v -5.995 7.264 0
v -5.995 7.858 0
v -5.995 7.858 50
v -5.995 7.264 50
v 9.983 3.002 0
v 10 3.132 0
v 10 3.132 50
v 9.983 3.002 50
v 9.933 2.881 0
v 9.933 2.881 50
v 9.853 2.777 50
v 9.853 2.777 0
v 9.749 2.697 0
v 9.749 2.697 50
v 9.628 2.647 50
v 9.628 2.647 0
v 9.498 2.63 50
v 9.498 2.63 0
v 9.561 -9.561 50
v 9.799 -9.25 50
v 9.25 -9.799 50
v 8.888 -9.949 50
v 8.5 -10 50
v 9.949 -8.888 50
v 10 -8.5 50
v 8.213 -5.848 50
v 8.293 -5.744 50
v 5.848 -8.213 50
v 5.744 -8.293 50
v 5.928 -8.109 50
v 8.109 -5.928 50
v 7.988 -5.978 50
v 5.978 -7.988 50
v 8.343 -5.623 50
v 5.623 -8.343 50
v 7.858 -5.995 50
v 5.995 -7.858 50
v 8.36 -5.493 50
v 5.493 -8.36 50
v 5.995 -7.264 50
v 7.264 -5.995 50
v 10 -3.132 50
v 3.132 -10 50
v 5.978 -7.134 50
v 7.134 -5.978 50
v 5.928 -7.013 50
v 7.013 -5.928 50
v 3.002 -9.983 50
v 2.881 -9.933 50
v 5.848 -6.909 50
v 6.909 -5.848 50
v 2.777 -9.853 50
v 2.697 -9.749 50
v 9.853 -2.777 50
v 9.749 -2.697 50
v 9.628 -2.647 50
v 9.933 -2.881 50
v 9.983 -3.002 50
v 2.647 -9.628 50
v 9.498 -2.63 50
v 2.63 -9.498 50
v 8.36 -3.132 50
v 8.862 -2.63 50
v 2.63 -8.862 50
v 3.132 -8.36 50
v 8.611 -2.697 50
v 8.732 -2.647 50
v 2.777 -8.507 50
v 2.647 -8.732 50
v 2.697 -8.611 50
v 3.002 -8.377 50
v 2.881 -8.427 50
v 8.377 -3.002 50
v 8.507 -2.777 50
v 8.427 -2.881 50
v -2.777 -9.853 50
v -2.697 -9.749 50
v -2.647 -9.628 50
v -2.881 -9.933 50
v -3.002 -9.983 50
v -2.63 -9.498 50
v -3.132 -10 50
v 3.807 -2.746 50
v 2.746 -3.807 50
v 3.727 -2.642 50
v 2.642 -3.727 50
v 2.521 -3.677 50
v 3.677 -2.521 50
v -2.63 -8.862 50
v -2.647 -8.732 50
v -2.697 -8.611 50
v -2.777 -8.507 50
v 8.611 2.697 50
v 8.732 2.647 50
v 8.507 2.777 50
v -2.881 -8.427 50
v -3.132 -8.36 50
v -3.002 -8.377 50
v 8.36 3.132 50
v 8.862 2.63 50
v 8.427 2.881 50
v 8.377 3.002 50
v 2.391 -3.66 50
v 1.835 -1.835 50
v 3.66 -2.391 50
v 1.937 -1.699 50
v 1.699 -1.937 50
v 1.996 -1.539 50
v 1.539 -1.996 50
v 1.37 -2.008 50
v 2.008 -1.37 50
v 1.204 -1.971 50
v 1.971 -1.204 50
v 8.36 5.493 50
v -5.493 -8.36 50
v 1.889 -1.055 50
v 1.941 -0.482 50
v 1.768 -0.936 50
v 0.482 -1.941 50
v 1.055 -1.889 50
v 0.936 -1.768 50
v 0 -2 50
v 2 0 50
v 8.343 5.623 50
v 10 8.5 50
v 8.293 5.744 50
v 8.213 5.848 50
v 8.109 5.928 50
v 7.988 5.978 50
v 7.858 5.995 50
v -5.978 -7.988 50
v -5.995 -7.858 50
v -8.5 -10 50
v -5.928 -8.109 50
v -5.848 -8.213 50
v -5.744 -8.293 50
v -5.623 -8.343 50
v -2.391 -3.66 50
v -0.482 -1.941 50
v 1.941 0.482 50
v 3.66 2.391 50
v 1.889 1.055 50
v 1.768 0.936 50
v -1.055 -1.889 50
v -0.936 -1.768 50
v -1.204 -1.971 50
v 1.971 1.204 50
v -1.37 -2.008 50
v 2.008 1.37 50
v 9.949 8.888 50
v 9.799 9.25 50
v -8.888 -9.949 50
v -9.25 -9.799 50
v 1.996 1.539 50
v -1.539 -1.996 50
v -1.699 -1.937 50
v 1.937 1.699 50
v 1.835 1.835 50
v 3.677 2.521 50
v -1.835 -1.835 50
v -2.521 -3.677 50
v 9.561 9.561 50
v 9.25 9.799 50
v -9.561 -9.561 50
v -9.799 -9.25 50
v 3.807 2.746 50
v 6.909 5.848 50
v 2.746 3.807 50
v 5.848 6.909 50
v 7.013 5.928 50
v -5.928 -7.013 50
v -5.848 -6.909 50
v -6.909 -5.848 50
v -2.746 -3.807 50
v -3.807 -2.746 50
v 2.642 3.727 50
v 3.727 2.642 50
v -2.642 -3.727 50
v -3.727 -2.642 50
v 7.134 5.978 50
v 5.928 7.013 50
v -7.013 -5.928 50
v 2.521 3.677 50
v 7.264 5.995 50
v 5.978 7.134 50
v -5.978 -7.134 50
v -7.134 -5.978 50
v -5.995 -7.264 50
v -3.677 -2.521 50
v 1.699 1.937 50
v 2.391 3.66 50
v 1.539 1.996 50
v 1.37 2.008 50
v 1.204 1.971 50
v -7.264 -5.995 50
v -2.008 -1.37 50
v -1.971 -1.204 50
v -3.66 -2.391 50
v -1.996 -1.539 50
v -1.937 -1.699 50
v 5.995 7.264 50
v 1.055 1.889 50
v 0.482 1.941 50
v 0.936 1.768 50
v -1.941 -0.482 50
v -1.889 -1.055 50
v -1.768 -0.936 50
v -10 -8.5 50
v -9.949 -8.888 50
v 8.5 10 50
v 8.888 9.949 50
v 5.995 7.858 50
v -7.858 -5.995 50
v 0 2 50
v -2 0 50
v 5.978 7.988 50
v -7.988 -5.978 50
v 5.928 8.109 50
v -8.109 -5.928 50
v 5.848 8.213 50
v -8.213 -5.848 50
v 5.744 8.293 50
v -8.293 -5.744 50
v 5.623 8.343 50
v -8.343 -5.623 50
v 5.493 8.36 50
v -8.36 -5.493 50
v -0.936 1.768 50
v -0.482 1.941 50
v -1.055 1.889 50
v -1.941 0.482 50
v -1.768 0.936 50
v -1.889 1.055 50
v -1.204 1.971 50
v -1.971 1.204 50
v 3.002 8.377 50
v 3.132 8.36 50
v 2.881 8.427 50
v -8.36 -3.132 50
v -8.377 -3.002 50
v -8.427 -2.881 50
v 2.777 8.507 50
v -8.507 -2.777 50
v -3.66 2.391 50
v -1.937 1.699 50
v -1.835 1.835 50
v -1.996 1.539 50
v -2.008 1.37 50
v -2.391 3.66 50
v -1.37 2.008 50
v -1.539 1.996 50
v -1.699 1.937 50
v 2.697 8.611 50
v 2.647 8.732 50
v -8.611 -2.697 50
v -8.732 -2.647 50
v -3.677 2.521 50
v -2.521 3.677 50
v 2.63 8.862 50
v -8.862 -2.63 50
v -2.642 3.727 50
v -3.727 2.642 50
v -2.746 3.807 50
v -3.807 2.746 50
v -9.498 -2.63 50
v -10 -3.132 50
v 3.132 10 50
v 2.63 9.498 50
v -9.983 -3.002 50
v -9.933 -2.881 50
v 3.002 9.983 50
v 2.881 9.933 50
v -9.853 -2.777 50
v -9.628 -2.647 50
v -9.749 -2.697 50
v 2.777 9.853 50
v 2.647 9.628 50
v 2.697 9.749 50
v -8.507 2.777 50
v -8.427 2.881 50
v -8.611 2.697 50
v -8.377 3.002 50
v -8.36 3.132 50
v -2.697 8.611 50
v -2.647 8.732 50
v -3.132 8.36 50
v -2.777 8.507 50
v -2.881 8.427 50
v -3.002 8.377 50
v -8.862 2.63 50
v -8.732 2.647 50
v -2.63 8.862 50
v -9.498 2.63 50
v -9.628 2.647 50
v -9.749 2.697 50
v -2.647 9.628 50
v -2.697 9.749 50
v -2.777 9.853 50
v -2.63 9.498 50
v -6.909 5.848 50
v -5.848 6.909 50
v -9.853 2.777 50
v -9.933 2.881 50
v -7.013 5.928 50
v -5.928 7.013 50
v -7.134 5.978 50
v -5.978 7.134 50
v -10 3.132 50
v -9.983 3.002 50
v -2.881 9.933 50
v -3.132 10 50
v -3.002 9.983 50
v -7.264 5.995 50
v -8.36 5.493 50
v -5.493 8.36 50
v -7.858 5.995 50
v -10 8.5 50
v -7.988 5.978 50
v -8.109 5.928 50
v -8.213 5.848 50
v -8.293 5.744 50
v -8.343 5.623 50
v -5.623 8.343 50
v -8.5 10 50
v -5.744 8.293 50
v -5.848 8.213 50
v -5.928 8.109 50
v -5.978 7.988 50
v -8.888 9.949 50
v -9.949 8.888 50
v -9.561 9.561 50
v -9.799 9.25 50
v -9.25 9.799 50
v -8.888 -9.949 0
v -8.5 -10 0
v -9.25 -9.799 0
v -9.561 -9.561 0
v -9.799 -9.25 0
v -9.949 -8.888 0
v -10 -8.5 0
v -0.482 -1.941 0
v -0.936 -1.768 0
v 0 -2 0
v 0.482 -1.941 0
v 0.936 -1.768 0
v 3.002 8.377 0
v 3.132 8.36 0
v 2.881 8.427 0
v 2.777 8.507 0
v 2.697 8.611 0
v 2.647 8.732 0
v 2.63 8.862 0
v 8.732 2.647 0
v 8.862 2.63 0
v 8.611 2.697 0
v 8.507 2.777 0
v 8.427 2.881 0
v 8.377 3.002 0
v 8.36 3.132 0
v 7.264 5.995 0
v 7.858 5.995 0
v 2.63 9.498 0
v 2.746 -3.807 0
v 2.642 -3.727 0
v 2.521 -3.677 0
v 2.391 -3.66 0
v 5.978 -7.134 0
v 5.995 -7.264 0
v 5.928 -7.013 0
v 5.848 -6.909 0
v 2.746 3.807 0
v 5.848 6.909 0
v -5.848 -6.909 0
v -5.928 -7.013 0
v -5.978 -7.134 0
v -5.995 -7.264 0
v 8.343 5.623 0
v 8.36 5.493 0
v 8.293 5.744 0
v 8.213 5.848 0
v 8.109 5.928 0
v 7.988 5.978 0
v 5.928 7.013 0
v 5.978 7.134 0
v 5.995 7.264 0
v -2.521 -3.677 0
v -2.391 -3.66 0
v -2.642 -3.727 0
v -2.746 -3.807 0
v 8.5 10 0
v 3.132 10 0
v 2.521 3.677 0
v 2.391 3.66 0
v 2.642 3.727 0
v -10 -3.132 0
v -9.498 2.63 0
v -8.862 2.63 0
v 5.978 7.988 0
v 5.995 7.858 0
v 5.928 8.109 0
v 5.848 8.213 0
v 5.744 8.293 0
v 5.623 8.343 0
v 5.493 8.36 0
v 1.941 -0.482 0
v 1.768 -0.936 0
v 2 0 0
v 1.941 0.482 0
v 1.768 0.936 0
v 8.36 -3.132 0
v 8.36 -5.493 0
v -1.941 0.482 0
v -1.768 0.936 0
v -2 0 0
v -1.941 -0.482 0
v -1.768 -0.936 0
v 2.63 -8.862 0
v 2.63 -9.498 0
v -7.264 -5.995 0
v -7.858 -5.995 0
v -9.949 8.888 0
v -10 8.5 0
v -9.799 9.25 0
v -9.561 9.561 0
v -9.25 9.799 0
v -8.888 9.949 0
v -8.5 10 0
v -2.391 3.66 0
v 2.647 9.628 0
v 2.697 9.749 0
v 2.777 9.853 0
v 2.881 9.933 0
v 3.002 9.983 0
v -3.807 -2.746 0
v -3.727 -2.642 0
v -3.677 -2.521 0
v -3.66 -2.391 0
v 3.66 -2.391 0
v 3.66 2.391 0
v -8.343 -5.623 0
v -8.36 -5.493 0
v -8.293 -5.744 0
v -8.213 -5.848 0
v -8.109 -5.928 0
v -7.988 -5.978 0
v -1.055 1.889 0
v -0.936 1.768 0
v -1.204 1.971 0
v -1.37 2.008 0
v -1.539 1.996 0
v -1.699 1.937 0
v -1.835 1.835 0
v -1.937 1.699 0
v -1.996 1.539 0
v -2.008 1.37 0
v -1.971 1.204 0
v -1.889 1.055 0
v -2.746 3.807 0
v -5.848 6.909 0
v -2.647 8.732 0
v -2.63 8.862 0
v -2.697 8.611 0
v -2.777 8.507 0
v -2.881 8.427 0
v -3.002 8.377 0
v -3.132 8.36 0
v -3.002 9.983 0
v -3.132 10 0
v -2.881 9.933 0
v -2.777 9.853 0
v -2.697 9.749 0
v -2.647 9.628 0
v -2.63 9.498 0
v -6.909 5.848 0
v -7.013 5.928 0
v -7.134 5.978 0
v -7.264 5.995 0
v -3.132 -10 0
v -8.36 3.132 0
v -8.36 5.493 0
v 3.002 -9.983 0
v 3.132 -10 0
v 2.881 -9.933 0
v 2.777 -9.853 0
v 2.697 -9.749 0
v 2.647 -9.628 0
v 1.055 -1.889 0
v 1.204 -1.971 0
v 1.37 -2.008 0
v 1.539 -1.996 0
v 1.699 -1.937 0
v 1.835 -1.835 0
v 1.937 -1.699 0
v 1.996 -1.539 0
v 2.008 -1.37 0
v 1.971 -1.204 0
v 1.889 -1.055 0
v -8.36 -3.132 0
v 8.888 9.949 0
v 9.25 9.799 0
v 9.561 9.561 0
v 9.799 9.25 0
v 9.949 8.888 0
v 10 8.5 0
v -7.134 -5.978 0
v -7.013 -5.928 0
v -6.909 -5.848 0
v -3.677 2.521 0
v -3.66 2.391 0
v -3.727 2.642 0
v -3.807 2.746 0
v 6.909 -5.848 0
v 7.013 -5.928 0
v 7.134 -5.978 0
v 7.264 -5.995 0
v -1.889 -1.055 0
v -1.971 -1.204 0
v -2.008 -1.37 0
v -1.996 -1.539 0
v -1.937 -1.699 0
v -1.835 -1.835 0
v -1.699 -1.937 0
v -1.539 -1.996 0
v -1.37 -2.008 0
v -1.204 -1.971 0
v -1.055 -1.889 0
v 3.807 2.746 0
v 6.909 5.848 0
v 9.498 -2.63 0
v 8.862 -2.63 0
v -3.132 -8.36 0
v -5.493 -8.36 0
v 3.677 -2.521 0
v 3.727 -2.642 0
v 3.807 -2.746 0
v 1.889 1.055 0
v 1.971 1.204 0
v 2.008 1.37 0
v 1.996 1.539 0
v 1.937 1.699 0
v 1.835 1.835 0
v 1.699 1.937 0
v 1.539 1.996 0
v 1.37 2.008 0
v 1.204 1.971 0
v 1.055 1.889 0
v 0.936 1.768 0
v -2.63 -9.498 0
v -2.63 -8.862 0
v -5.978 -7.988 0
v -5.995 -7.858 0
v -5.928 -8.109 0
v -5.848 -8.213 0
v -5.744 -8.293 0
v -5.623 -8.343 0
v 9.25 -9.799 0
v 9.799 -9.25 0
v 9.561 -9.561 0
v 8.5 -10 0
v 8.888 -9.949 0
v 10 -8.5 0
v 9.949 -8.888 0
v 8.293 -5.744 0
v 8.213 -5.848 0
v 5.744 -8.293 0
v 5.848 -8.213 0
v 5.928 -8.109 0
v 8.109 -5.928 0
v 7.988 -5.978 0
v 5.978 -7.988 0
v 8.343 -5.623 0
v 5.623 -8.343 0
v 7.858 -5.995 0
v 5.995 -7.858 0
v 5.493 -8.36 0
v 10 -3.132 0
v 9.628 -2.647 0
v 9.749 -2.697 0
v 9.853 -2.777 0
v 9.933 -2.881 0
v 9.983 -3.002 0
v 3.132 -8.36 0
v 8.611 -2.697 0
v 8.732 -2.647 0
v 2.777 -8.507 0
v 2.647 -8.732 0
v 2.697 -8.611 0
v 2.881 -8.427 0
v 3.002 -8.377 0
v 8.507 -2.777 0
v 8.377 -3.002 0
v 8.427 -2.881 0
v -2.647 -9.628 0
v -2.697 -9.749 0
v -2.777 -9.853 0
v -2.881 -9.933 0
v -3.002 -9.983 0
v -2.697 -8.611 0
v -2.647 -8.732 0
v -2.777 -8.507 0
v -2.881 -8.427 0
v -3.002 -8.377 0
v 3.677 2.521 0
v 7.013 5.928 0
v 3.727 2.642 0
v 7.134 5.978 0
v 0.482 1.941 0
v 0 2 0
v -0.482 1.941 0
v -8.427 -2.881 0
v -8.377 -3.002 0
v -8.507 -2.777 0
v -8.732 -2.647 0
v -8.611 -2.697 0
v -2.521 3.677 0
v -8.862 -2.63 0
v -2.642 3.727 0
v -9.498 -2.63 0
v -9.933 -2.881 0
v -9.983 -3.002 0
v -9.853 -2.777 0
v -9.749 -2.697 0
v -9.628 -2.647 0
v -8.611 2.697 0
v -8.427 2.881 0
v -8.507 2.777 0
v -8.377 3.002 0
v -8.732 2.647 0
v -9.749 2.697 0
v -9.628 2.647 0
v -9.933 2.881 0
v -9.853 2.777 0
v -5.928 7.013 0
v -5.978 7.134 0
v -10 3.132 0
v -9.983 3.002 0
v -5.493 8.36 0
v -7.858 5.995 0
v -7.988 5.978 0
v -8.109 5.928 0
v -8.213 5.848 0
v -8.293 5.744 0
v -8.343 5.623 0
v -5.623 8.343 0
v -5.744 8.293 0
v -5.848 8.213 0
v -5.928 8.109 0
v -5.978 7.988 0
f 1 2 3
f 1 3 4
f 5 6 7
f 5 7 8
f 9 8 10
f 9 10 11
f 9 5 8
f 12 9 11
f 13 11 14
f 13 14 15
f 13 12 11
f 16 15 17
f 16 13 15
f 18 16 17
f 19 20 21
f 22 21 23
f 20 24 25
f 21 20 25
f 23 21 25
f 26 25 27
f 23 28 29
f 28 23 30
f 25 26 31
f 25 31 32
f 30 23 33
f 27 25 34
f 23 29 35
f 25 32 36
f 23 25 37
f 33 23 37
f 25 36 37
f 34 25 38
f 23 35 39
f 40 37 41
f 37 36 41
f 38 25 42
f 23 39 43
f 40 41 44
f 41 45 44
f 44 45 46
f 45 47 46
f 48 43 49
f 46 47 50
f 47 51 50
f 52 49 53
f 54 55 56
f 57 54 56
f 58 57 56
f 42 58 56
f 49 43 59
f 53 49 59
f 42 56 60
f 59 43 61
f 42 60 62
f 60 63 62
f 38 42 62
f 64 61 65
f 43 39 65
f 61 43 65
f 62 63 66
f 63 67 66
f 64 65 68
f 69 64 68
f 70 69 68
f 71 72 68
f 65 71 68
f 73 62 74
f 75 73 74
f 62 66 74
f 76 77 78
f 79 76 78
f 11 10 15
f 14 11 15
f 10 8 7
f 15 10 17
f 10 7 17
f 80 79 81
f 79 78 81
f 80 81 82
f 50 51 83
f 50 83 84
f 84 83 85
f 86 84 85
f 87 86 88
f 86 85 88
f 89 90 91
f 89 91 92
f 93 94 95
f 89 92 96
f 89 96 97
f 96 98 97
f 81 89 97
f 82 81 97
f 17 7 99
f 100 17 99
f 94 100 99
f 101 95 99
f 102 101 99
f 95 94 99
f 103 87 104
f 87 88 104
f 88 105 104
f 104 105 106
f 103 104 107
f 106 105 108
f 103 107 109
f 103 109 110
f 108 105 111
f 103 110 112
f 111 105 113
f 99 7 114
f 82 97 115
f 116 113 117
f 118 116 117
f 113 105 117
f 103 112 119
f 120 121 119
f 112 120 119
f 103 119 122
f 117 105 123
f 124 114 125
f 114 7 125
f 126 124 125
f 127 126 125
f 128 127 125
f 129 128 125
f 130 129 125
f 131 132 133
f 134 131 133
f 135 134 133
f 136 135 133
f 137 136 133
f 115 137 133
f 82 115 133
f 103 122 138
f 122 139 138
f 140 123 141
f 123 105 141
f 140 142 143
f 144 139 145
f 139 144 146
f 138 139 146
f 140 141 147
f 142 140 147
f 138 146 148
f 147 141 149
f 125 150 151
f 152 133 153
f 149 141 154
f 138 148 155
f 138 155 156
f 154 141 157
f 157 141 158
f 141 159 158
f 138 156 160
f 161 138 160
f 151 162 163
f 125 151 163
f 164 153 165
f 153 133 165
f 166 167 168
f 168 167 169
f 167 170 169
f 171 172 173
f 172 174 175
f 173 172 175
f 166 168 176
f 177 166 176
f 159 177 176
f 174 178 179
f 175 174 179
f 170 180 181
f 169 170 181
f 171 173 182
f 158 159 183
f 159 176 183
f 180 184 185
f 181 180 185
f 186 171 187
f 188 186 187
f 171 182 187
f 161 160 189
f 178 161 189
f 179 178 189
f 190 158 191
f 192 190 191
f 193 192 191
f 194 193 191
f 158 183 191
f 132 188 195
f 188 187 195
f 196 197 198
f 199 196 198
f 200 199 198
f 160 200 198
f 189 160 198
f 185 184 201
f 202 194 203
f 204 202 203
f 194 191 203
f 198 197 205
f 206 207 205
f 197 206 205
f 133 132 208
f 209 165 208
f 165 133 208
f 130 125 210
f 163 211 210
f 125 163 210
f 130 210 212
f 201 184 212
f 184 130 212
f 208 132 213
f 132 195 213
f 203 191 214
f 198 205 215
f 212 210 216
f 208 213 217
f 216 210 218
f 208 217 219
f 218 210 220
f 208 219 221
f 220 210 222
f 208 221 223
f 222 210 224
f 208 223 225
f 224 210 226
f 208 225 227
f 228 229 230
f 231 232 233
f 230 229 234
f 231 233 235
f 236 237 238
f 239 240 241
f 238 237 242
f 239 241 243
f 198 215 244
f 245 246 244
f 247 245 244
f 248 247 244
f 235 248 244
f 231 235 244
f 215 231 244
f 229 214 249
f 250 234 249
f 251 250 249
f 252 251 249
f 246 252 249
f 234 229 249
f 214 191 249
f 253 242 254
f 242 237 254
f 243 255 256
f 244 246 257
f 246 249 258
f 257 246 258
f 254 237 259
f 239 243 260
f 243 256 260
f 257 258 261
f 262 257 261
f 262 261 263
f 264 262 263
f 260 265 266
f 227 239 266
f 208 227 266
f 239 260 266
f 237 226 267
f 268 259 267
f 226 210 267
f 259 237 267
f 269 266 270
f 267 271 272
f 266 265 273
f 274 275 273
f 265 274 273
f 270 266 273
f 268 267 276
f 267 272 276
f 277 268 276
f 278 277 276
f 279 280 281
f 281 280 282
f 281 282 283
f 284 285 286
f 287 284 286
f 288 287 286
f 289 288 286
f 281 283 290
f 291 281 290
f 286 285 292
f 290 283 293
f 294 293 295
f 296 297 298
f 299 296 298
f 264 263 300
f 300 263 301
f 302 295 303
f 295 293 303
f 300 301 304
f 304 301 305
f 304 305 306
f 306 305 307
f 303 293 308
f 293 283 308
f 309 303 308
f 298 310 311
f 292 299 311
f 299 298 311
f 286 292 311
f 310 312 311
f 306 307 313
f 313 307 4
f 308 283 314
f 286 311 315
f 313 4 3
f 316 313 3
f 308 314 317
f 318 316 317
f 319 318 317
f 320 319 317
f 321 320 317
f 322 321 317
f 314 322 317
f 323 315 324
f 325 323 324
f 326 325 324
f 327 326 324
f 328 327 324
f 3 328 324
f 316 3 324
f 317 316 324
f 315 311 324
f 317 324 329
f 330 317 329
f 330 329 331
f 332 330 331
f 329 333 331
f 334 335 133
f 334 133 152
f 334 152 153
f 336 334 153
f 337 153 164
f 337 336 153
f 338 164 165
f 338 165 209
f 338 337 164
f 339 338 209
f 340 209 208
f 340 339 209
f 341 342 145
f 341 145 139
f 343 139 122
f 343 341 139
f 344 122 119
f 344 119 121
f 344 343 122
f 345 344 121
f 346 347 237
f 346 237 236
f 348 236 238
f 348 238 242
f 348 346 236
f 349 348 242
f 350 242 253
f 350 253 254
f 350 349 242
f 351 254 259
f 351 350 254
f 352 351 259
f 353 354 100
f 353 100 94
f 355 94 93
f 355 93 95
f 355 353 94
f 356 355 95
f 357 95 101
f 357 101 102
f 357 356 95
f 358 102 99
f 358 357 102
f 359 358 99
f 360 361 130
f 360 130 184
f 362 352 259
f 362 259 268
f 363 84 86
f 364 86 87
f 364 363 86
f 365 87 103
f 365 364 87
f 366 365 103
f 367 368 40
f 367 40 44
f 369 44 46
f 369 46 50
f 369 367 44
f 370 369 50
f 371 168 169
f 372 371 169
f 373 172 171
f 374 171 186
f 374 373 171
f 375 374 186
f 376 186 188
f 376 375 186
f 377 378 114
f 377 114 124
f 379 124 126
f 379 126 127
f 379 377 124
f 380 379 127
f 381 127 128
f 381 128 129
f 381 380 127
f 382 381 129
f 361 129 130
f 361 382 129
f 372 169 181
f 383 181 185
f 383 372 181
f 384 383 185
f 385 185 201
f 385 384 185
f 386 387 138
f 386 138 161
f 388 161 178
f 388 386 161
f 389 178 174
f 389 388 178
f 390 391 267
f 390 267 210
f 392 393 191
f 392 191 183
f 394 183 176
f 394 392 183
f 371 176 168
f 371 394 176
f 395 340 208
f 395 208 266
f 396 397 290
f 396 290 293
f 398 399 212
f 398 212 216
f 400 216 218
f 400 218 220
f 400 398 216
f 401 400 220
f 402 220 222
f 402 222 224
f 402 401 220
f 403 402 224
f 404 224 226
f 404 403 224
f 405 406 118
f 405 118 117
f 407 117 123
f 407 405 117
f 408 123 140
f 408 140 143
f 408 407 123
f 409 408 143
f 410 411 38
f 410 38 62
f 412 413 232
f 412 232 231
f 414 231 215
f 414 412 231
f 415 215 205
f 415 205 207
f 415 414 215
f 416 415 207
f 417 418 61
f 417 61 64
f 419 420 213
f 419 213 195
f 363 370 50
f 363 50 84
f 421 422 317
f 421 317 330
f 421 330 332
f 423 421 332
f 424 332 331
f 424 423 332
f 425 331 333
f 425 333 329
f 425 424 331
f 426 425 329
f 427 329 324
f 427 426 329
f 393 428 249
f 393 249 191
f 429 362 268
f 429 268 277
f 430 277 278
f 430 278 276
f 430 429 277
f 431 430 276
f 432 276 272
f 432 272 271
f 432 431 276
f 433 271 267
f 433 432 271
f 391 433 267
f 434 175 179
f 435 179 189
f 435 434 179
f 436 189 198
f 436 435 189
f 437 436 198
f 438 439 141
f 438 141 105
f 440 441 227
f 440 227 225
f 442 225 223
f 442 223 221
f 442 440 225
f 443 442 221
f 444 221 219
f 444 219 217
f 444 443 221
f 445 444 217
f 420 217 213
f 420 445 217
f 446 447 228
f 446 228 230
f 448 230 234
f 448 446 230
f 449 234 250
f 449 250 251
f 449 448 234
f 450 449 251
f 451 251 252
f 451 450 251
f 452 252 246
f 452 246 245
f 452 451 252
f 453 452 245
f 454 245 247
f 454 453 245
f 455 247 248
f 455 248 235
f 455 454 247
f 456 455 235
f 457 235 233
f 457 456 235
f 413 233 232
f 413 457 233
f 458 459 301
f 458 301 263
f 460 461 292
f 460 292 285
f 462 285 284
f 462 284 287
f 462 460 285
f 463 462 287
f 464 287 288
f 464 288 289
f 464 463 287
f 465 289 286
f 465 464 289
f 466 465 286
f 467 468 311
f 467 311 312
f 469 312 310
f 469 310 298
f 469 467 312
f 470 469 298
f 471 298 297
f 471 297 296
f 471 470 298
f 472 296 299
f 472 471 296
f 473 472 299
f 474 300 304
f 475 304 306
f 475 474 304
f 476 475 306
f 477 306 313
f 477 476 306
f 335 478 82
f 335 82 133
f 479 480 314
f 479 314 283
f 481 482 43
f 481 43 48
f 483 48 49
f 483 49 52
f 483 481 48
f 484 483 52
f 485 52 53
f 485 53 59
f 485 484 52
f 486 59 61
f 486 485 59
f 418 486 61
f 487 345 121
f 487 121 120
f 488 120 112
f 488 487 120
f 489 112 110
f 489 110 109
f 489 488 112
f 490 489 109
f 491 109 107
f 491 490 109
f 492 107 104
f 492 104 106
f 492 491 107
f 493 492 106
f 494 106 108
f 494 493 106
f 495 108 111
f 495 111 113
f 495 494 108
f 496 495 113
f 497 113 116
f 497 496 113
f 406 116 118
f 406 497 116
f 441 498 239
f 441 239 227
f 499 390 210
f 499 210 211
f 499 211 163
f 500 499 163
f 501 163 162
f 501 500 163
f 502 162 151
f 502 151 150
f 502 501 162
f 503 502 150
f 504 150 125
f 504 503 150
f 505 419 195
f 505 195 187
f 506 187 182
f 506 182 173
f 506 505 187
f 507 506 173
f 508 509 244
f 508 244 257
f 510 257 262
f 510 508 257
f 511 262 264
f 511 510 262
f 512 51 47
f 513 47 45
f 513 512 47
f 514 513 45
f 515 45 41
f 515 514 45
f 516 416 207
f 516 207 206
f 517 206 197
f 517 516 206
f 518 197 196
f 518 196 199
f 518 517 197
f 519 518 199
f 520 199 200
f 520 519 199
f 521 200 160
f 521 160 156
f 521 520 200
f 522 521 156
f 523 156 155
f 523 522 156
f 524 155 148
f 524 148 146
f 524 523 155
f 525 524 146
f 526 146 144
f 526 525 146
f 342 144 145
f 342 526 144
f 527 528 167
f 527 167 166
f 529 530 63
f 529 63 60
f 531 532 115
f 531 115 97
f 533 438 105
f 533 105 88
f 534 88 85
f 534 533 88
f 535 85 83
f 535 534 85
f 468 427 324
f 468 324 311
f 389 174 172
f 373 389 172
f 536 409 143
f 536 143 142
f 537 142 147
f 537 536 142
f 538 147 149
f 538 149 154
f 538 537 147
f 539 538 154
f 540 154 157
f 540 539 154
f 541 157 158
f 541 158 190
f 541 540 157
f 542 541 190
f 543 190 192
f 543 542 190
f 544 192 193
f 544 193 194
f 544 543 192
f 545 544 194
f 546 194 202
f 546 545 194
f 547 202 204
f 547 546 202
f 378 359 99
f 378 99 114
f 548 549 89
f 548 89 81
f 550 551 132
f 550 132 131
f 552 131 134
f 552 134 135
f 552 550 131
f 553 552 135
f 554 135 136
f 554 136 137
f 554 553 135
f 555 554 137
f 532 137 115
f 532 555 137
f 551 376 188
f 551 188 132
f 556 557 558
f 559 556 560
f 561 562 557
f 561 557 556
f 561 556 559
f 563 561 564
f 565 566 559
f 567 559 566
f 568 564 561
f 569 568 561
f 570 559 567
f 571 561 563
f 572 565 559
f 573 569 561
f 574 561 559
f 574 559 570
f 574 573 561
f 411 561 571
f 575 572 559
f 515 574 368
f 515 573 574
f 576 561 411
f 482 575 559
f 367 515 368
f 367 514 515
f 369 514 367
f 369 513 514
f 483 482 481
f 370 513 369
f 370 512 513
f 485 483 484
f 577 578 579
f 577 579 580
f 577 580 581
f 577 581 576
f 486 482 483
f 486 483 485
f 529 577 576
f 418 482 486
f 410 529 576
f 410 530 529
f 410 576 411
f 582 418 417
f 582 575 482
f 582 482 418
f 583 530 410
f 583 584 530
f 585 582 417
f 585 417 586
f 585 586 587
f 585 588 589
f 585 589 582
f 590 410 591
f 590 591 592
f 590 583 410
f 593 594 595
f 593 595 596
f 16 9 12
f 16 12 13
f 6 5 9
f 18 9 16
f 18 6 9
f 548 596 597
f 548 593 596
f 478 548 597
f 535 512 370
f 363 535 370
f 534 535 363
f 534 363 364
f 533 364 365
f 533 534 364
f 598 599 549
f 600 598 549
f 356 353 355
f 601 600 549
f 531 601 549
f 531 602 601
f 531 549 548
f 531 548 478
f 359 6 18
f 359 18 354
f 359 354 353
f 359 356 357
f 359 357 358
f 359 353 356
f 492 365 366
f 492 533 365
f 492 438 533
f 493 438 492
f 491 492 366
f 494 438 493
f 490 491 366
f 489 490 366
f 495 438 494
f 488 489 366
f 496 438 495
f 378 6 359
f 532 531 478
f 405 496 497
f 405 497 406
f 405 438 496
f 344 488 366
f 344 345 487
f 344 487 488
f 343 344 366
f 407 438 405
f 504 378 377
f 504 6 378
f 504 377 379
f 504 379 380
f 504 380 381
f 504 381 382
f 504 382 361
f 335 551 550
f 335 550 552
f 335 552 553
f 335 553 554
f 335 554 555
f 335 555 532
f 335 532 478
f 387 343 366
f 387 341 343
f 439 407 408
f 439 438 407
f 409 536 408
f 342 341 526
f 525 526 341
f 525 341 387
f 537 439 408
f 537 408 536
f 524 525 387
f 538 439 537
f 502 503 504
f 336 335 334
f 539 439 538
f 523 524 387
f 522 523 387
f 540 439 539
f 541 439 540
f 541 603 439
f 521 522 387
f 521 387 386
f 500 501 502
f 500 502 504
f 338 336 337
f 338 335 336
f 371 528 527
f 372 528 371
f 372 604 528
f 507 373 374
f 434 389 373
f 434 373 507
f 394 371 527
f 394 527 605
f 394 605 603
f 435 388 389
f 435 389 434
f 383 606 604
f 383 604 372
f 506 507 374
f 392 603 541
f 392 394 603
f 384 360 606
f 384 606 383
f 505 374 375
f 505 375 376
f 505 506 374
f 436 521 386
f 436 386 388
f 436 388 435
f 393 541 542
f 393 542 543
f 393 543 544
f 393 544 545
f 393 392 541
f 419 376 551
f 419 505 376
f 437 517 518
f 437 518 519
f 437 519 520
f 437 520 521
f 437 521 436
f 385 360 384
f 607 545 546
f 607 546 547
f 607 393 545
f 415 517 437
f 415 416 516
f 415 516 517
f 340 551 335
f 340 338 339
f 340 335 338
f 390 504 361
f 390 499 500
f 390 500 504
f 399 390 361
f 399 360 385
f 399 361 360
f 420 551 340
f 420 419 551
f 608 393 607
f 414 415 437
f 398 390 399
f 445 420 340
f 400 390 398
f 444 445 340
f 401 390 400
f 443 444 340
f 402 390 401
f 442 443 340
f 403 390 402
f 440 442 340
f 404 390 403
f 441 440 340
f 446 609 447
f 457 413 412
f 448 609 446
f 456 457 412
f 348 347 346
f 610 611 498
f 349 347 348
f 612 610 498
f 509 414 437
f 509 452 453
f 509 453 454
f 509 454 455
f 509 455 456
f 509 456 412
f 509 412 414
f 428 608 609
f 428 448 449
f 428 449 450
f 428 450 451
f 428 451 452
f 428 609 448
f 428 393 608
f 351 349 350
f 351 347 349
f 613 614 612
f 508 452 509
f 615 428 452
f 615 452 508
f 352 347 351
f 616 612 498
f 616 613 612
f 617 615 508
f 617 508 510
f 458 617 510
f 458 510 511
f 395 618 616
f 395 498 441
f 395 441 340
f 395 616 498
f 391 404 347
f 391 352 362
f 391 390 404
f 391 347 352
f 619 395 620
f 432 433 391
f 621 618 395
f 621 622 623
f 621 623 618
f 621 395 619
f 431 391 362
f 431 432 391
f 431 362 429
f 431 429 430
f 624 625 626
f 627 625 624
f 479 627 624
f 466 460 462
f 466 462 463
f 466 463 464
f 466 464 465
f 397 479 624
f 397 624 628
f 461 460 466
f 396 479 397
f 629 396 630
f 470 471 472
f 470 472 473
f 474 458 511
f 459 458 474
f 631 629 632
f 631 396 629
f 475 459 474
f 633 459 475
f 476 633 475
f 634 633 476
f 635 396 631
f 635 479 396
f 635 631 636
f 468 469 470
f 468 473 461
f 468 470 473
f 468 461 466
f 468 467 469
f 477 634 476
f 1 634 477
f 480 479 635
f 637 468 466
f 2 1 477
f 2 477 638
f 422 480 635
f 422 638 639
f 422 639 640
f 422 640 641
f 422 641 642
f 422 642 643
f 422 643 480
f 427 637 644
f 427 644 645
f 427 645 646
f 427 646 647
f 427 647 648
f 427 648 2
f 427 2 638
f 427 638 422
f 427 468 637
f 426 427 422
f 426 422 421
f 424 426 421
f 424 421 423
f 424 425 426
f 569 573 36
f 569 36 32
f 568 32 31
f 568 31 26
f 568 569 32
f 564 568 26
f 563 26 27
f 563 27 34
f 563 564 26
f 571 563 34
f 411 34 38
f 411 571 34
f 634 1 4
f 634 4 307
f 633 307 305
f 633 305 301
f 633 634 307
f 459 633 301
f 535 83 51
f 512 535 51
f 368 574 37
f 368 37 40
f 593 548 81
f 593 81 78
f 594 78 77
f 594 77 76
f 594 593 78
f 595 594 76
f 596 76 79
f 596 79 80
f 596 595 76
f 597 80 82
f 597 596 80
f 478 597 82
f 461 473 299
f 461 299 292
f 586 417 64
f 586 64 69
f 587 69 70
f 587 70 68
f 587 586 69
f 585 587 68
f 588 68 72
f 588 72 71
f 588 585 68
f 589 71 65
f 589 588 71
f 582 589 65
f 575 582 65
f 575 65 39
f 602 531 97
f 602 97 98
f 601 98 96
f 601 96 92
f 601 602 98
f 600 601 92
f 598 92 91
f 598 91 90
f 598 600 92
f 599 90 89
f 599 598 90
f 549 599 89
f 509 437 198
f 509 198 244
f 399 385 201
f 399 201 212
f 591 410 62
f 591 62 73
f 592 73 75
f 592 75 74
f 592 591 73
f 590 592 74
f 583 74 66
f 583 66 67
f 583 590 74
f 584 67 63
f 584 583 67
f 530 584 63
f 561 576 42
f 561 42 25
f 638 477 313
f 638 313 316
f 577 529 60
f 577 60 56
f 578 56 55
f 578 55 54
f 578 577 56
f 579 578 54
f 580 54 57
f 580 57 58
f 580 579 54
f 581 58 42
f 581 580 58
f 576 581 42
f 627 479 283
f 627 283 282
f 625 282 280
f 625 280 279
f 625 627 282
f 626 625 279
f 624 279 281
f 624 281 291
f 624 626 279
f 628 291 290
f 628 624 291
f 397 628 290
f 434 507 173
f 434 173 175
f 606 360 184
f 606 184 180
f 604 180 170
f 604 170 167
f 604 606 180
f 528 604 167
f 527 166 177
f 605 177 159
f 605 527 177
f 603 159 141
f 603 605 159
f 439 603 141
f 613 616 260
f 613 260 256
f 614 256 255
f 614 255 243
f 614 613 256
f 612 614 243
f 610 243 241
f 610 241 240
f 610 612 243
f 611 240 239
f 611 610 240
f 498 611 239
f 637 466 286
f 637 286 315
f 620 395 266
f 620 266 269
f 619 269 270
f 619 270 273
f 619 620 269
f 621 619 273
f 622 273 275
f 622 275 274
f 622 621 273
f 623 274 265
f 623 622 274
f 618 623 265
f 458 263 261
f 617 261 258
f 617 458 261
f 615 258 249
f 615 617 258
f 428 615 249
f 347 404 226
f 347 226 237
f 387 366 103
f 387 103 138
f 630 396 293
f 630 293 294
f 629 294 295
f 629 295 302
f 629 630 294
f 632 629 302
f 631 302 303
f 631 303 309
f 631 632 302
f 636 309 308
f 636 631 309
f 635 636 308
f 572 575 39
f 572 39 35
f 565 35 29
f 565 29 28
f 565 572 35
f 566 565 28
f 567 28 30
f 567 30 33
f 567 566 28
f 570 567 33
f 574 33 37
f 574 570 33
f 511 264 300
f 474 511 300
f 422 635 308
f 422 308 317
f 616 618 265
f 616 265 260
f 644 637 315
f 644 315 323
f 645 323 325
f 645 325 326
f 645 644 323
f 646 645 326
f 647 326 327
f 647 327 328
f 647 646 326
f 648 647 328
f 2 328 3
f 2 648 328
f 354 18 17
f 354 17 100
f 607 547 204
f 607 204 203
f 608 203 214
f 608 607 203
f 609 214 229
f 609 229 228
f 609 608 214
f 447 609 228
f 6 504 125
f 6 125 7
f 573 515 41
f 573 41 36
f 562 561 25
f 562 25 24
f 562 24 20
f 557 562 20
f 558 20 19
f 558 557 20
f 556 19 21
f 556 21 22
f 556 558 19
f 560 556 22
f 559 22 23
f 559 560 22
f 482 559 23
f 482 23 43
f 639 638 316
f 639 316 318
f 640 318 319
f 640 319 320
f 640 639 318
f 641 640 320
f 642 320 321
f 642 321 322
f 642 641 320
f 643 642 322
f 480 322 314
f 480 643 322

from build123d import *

# Parameters (mm, degrees)
BOSS_EXTRUDE1_DEPTH = 50


with BuildPart() as part:
    # Sketch1 → Boss-Extrude1 (new body)
    with BuildSketch(Plane.XY):
        with BuildLine():
            Line((-2.746356642, -3.807016814), (-5.847983186, -6.908643358))
            ThreePointArc((-5.847983186, -6.908643358), (-5.956791575, -7.07148662), (-5.995, -7.263573344))
            Line((-5.995, -7.263573344), (-5.995, -7.858053199))
            ThreePointArc((-5.995, -7.858053199), (-5.847983186, -8.212983186), (-5.493053199, -8.36))
            Line((-5.493053199, -8.36), (-3.131946801, -8.36))
            ThreePointArc((-3.131946801, -8.36), (-2.777016814, -8.507016814), (-2.63, -8.861946801))
            Line((-2.63, -8.861946801), (-2.63, -9.498053199))
            ThreePointArc((-2.63, -9.498053199), (-2.777016814, -9.852983186), (-3.131946801, -10))
            Line((-3.131946801, -10), (-8.5, -10))
            ThreePointArc((-8.5, -10), (-9.560660172, -9.560660172), (-10, -8.5))
            Line((-10, -8.5), (-10, -3.131946801))
            ThreePointArc((-10, -3.131946801), (-9.852983186, -2.777016814), (-9.498053199, -2.63))
            Line((-9.498053199, -2.63), (-8.861946801, -2.63))
            ThreePointArc((-8.861946801, -2.63), (-8.507016814, -2.777016814), (-8.36, -3.131946801))
            Line((-8.36, -3.131946801), (-8.36, -5.493053199))
            ThreePointArc((-8.36, -5.493053199), (-8.212983186, -5.847983186), (-7.858053199, -5.995))
            Line((-7.858053199, -5.995), (-7.263573344, -5.995))
            ThreePointArc((-7.263573344, -5.995), (-7.07148662, -5.956791575), (-6.908643358, -5.847983186))
            Line((-6.908643358, -5.847983186), (-3.807016814, -2.746356642))
            ThreePointArc((-3.807016814, -2.746356642), (-3.698208425, -2.58351338), (-3.66, -2.391426656))
            Line((-3.66, -2.391426656), (-3.66, 2.391426656))
            ThreePointArc((-3.66, 2.391426656), (-3.698208425, 2.58351338), (-3.807016814, 2.746356642))
            Line((-3.807016814, 2.746356642), (-6.908643358, 5.847983186))
            ThreePointArc((-6.908643358, 5.847983186), (-7.07148662, 5.956791575), (-7.263573344, 5.995))
            Line((-7.263573344, 5.995), (-7.858053199, 5.995))
            ThreePointArc((-7.858053199, 5.995), (-8.212983186, 5.847983186), (-8.36, 5.493053199))
            Line((-8.36, 5.493053199), (-8.36, 3.131946801))
            ThreePointArc((-8.36, 3.131946801), (-8.507016814, 2.777016814), (-8.861946801, 2.63))
            Line((-8.861946801, 2.63), (-9.498053199, 2.63))
            ThreePointArc((-9.498053199, 2.63), (-9.852983186, 2.777016814), (-10, 3.131946801))
            Line((-10, 3.131946801), (-10, 8.5))
            ThreePointArc((-10, 8.5), (-9.560660172, 9.560660172), (-8.5, 10))
            Line((-8.5, 10), (-3.131946801, 10))
            ThreePointArc((-3.131946801, 10), (-2.777016814, 9.852983186), (-2.63, 9.498053199))
            Line((-2.63, 9.498053199), (-2.63, 8.861946801))
            ThreePointArc((-2.63, 8.861946801), (-2.777016814, 8.507016814), (-3.131946801, 8.36))
            Line((-3.131946801, 8.36), (-5.493053199, 8.36))
            ThreePointArc((-5.493053199, 8.36), (-5.847983186, 8.212983186), (-5.995, 7.858053199))
            Line((-5.995, 7.858053199), (-5.995, 7.263573344))
            ThreePointArc((-5.995, 7.263573344), (-5.956791575, 7.07148662), (-5.847983186, 6.908643358))
            Line((-5.847983186, 6.908643358), (-2.746356642, 3.807016814))
            ThreePointArc((-2.746356642, 3.807016814), (-2.58351338, 3.698208425), (-2.391426656, 3.66))
            Line((-2.391426656, 3.66), (2.391426656, 3.66))
            ThreePointArc((2.391426656, 3.66), (2.58351338, 3.698208425), (2.746356642, 3.807016814))
            Line((2.746356642, 3.807016814), (5.847983186, 6.908643358))
            ThreePointArc((5.847983186, 6.908643358), (5.956791575, 7.07148662), (5.995, 7.263573344))
            Line((5.995, 7.263573344), (5.995, 7.858053199))
            ThreePointArc((5.995, 7.858053199), (5.847983186, 8.212983186), (5.493053199, 8.36))
            Line((5.493053199, 8.36), (3.131946801, 8.36))
            ThreePointArc((3.131946801, 8.36), (2.777016814, 8.507016814), (2.63, 8.861946801))
            Line((2.63, 8.861946801), (2.63, 9.498053199))
            ThreePointArc((2.63, 9.498053199), (2.777016814, 9.852983186), (3.131946801, 10))
            Line((3.131946801, 10), (8.5, 10))
            ThreePointArc((8.5, 10), (9.560660172, 9.560660172), (10, 8.5))
            Line((10, 8.5), (10, 3.131946801))
            ThreePointArc((10, 3.131946801), (9.852983186, 2.777016814), (9.498053199, 2.63))
            Line((9.498053199, 2.63), (8.861946801, 2.63))
            ThreePointArc((8.861946801, 2.63), (8.507016814, 2.777016814), (8.36, 3.131946801))
            Line((8.36, 3.131946801), (8.36, 5.493053199))
            ThreePointArc((8.36, 5.493053199), (8.212983186, 5.847983186), (7.858053199, 5.995))
            Line((7.858053199, 5.995), (7.263573344, 5.995))
            ThreePointArc((7.263573344, 5.995), (7.07148662, 5.956791575), (6.908643358, 5.847983186))
            Line((6.908643358, 5.847983186), (3.807016814, 2.746356642))
            ThreePointArc((3.807016814, 2.746356642), (3.698208425, 2.58351338), (3.66, 2.391426656))
            Line((3.66, 2.391426656), (3.66, -2.391426656))
            ThreePointArc((3.66, -2.391426656), (3.698208425, -2.58351338), (3.807016814, -2.746356642))
            Line((3.807016814, -2.746356642), (6.908643358, -5.847983186))
            ThreePointArc((6.908643358, -5.847983186), (7.07148662, -5.956791575), (7.263573344, -5.995))
            Line((7.263573344, -5.995), (7.858053199, -5.995))
            ThreePointArc((7.858053199, -5.995), (8.212983186, -5.847983186), (8.36, -5.493053199))
            Line((8.36, -5.493053199), (8.36, -3.131946801))
            ThreePointArc((8.36, -3.131946801), (8.507016814, -2.777016814), (8.861946801, -2.63))
            Line((8.861946801, -2.63), (9.498053199, -2.63))
            ThreePointArc((9.498053199, -2.63), (9.852983186, -2.777016814), (10, -3.131946801))
            Line((10, -3.131946801), (10, -8.5))
            ThreePointArc((10, -8.5), (9.560660172, -9.560660172), (8.5, -10))
            Line((8.5, -10), (3.131946801, -10))
            ThreePointArc((3.131946801, -10), (2.777016814, -9.852983186), (2.63, -9.498053199))
            Line((2.63, -9.498053199), (2.63, -8.861946801))
            ThreePointArc((2.63, -8.861946801), (2.777016814, -8.507016814), (3.131946801, -8.36))
            Line((3.131946801, -8.36), (5.493053199, -8.36))
            ThreePointArc((5.493053199, -8.36), (5.847983186, -8.212983186), (5.995, -7.858053199))
            Line((5.995, -7.858053199), (5.995, -7.263573344))
            ThreePointArc((5.995, -7.263573344), (5.956791575, -7.07148662), (5.847983186, -6.908643358))
            Line((5.847983186, -6.908643358), (2.746356642, -3.807016814))
            ThreePointArc((2.746356642, -3.807016814), (2.58351338, -3.698208425), (2.391426656, -3.66))
            Line((2.391426656, -3.66), (-2.391426656, -3.66))
            ThreePointArc((-2.391426656, -3.66), (-2.58351338, -3.698208425), (-2.746356642, -3.807016814))
        make_face()
        with BuildLine():
            ThreePointArc((-1.767678053, 0.935582333), (-2, 0), (-1.767678053, -0.935582333))
            ThreePointArc((-1.767678053, -0.935582333), (-1.834942097, -1.834942097), (-0.935582333, -1.767678053))
            ThreePointArc((-0.935582333, -1.767678053), (0, -2), (0.935582333, -1.767678053))
            ThreePointArc((0.935582333, -1.767678053), (1.834942097, -1.834942097), (1.767678053, -0.935582333))
            ThreePointArc((1.767678053, -0.935582333), (2, 0), (1.767678053, 0.935582333))
            ThreePointArc((1.767678053, 0.935582333), (1.834942097, 1.834942097), (0.935582333, 1.767678053))
            ThreePointArc((0.935582333, 1.767678053), (0, 2), (-0.935582333, 1.767678053))
            ThreePointArc((-0.935582333, 1.767678053), (-1.834942097, 1.834942097), (-1.767678053, 0.935582333))
        make_face(mode=Mode.SUBTRACT)
    extrude(amount=BOSS_EXTRUDE1_DEPTH)


solid = part.part
